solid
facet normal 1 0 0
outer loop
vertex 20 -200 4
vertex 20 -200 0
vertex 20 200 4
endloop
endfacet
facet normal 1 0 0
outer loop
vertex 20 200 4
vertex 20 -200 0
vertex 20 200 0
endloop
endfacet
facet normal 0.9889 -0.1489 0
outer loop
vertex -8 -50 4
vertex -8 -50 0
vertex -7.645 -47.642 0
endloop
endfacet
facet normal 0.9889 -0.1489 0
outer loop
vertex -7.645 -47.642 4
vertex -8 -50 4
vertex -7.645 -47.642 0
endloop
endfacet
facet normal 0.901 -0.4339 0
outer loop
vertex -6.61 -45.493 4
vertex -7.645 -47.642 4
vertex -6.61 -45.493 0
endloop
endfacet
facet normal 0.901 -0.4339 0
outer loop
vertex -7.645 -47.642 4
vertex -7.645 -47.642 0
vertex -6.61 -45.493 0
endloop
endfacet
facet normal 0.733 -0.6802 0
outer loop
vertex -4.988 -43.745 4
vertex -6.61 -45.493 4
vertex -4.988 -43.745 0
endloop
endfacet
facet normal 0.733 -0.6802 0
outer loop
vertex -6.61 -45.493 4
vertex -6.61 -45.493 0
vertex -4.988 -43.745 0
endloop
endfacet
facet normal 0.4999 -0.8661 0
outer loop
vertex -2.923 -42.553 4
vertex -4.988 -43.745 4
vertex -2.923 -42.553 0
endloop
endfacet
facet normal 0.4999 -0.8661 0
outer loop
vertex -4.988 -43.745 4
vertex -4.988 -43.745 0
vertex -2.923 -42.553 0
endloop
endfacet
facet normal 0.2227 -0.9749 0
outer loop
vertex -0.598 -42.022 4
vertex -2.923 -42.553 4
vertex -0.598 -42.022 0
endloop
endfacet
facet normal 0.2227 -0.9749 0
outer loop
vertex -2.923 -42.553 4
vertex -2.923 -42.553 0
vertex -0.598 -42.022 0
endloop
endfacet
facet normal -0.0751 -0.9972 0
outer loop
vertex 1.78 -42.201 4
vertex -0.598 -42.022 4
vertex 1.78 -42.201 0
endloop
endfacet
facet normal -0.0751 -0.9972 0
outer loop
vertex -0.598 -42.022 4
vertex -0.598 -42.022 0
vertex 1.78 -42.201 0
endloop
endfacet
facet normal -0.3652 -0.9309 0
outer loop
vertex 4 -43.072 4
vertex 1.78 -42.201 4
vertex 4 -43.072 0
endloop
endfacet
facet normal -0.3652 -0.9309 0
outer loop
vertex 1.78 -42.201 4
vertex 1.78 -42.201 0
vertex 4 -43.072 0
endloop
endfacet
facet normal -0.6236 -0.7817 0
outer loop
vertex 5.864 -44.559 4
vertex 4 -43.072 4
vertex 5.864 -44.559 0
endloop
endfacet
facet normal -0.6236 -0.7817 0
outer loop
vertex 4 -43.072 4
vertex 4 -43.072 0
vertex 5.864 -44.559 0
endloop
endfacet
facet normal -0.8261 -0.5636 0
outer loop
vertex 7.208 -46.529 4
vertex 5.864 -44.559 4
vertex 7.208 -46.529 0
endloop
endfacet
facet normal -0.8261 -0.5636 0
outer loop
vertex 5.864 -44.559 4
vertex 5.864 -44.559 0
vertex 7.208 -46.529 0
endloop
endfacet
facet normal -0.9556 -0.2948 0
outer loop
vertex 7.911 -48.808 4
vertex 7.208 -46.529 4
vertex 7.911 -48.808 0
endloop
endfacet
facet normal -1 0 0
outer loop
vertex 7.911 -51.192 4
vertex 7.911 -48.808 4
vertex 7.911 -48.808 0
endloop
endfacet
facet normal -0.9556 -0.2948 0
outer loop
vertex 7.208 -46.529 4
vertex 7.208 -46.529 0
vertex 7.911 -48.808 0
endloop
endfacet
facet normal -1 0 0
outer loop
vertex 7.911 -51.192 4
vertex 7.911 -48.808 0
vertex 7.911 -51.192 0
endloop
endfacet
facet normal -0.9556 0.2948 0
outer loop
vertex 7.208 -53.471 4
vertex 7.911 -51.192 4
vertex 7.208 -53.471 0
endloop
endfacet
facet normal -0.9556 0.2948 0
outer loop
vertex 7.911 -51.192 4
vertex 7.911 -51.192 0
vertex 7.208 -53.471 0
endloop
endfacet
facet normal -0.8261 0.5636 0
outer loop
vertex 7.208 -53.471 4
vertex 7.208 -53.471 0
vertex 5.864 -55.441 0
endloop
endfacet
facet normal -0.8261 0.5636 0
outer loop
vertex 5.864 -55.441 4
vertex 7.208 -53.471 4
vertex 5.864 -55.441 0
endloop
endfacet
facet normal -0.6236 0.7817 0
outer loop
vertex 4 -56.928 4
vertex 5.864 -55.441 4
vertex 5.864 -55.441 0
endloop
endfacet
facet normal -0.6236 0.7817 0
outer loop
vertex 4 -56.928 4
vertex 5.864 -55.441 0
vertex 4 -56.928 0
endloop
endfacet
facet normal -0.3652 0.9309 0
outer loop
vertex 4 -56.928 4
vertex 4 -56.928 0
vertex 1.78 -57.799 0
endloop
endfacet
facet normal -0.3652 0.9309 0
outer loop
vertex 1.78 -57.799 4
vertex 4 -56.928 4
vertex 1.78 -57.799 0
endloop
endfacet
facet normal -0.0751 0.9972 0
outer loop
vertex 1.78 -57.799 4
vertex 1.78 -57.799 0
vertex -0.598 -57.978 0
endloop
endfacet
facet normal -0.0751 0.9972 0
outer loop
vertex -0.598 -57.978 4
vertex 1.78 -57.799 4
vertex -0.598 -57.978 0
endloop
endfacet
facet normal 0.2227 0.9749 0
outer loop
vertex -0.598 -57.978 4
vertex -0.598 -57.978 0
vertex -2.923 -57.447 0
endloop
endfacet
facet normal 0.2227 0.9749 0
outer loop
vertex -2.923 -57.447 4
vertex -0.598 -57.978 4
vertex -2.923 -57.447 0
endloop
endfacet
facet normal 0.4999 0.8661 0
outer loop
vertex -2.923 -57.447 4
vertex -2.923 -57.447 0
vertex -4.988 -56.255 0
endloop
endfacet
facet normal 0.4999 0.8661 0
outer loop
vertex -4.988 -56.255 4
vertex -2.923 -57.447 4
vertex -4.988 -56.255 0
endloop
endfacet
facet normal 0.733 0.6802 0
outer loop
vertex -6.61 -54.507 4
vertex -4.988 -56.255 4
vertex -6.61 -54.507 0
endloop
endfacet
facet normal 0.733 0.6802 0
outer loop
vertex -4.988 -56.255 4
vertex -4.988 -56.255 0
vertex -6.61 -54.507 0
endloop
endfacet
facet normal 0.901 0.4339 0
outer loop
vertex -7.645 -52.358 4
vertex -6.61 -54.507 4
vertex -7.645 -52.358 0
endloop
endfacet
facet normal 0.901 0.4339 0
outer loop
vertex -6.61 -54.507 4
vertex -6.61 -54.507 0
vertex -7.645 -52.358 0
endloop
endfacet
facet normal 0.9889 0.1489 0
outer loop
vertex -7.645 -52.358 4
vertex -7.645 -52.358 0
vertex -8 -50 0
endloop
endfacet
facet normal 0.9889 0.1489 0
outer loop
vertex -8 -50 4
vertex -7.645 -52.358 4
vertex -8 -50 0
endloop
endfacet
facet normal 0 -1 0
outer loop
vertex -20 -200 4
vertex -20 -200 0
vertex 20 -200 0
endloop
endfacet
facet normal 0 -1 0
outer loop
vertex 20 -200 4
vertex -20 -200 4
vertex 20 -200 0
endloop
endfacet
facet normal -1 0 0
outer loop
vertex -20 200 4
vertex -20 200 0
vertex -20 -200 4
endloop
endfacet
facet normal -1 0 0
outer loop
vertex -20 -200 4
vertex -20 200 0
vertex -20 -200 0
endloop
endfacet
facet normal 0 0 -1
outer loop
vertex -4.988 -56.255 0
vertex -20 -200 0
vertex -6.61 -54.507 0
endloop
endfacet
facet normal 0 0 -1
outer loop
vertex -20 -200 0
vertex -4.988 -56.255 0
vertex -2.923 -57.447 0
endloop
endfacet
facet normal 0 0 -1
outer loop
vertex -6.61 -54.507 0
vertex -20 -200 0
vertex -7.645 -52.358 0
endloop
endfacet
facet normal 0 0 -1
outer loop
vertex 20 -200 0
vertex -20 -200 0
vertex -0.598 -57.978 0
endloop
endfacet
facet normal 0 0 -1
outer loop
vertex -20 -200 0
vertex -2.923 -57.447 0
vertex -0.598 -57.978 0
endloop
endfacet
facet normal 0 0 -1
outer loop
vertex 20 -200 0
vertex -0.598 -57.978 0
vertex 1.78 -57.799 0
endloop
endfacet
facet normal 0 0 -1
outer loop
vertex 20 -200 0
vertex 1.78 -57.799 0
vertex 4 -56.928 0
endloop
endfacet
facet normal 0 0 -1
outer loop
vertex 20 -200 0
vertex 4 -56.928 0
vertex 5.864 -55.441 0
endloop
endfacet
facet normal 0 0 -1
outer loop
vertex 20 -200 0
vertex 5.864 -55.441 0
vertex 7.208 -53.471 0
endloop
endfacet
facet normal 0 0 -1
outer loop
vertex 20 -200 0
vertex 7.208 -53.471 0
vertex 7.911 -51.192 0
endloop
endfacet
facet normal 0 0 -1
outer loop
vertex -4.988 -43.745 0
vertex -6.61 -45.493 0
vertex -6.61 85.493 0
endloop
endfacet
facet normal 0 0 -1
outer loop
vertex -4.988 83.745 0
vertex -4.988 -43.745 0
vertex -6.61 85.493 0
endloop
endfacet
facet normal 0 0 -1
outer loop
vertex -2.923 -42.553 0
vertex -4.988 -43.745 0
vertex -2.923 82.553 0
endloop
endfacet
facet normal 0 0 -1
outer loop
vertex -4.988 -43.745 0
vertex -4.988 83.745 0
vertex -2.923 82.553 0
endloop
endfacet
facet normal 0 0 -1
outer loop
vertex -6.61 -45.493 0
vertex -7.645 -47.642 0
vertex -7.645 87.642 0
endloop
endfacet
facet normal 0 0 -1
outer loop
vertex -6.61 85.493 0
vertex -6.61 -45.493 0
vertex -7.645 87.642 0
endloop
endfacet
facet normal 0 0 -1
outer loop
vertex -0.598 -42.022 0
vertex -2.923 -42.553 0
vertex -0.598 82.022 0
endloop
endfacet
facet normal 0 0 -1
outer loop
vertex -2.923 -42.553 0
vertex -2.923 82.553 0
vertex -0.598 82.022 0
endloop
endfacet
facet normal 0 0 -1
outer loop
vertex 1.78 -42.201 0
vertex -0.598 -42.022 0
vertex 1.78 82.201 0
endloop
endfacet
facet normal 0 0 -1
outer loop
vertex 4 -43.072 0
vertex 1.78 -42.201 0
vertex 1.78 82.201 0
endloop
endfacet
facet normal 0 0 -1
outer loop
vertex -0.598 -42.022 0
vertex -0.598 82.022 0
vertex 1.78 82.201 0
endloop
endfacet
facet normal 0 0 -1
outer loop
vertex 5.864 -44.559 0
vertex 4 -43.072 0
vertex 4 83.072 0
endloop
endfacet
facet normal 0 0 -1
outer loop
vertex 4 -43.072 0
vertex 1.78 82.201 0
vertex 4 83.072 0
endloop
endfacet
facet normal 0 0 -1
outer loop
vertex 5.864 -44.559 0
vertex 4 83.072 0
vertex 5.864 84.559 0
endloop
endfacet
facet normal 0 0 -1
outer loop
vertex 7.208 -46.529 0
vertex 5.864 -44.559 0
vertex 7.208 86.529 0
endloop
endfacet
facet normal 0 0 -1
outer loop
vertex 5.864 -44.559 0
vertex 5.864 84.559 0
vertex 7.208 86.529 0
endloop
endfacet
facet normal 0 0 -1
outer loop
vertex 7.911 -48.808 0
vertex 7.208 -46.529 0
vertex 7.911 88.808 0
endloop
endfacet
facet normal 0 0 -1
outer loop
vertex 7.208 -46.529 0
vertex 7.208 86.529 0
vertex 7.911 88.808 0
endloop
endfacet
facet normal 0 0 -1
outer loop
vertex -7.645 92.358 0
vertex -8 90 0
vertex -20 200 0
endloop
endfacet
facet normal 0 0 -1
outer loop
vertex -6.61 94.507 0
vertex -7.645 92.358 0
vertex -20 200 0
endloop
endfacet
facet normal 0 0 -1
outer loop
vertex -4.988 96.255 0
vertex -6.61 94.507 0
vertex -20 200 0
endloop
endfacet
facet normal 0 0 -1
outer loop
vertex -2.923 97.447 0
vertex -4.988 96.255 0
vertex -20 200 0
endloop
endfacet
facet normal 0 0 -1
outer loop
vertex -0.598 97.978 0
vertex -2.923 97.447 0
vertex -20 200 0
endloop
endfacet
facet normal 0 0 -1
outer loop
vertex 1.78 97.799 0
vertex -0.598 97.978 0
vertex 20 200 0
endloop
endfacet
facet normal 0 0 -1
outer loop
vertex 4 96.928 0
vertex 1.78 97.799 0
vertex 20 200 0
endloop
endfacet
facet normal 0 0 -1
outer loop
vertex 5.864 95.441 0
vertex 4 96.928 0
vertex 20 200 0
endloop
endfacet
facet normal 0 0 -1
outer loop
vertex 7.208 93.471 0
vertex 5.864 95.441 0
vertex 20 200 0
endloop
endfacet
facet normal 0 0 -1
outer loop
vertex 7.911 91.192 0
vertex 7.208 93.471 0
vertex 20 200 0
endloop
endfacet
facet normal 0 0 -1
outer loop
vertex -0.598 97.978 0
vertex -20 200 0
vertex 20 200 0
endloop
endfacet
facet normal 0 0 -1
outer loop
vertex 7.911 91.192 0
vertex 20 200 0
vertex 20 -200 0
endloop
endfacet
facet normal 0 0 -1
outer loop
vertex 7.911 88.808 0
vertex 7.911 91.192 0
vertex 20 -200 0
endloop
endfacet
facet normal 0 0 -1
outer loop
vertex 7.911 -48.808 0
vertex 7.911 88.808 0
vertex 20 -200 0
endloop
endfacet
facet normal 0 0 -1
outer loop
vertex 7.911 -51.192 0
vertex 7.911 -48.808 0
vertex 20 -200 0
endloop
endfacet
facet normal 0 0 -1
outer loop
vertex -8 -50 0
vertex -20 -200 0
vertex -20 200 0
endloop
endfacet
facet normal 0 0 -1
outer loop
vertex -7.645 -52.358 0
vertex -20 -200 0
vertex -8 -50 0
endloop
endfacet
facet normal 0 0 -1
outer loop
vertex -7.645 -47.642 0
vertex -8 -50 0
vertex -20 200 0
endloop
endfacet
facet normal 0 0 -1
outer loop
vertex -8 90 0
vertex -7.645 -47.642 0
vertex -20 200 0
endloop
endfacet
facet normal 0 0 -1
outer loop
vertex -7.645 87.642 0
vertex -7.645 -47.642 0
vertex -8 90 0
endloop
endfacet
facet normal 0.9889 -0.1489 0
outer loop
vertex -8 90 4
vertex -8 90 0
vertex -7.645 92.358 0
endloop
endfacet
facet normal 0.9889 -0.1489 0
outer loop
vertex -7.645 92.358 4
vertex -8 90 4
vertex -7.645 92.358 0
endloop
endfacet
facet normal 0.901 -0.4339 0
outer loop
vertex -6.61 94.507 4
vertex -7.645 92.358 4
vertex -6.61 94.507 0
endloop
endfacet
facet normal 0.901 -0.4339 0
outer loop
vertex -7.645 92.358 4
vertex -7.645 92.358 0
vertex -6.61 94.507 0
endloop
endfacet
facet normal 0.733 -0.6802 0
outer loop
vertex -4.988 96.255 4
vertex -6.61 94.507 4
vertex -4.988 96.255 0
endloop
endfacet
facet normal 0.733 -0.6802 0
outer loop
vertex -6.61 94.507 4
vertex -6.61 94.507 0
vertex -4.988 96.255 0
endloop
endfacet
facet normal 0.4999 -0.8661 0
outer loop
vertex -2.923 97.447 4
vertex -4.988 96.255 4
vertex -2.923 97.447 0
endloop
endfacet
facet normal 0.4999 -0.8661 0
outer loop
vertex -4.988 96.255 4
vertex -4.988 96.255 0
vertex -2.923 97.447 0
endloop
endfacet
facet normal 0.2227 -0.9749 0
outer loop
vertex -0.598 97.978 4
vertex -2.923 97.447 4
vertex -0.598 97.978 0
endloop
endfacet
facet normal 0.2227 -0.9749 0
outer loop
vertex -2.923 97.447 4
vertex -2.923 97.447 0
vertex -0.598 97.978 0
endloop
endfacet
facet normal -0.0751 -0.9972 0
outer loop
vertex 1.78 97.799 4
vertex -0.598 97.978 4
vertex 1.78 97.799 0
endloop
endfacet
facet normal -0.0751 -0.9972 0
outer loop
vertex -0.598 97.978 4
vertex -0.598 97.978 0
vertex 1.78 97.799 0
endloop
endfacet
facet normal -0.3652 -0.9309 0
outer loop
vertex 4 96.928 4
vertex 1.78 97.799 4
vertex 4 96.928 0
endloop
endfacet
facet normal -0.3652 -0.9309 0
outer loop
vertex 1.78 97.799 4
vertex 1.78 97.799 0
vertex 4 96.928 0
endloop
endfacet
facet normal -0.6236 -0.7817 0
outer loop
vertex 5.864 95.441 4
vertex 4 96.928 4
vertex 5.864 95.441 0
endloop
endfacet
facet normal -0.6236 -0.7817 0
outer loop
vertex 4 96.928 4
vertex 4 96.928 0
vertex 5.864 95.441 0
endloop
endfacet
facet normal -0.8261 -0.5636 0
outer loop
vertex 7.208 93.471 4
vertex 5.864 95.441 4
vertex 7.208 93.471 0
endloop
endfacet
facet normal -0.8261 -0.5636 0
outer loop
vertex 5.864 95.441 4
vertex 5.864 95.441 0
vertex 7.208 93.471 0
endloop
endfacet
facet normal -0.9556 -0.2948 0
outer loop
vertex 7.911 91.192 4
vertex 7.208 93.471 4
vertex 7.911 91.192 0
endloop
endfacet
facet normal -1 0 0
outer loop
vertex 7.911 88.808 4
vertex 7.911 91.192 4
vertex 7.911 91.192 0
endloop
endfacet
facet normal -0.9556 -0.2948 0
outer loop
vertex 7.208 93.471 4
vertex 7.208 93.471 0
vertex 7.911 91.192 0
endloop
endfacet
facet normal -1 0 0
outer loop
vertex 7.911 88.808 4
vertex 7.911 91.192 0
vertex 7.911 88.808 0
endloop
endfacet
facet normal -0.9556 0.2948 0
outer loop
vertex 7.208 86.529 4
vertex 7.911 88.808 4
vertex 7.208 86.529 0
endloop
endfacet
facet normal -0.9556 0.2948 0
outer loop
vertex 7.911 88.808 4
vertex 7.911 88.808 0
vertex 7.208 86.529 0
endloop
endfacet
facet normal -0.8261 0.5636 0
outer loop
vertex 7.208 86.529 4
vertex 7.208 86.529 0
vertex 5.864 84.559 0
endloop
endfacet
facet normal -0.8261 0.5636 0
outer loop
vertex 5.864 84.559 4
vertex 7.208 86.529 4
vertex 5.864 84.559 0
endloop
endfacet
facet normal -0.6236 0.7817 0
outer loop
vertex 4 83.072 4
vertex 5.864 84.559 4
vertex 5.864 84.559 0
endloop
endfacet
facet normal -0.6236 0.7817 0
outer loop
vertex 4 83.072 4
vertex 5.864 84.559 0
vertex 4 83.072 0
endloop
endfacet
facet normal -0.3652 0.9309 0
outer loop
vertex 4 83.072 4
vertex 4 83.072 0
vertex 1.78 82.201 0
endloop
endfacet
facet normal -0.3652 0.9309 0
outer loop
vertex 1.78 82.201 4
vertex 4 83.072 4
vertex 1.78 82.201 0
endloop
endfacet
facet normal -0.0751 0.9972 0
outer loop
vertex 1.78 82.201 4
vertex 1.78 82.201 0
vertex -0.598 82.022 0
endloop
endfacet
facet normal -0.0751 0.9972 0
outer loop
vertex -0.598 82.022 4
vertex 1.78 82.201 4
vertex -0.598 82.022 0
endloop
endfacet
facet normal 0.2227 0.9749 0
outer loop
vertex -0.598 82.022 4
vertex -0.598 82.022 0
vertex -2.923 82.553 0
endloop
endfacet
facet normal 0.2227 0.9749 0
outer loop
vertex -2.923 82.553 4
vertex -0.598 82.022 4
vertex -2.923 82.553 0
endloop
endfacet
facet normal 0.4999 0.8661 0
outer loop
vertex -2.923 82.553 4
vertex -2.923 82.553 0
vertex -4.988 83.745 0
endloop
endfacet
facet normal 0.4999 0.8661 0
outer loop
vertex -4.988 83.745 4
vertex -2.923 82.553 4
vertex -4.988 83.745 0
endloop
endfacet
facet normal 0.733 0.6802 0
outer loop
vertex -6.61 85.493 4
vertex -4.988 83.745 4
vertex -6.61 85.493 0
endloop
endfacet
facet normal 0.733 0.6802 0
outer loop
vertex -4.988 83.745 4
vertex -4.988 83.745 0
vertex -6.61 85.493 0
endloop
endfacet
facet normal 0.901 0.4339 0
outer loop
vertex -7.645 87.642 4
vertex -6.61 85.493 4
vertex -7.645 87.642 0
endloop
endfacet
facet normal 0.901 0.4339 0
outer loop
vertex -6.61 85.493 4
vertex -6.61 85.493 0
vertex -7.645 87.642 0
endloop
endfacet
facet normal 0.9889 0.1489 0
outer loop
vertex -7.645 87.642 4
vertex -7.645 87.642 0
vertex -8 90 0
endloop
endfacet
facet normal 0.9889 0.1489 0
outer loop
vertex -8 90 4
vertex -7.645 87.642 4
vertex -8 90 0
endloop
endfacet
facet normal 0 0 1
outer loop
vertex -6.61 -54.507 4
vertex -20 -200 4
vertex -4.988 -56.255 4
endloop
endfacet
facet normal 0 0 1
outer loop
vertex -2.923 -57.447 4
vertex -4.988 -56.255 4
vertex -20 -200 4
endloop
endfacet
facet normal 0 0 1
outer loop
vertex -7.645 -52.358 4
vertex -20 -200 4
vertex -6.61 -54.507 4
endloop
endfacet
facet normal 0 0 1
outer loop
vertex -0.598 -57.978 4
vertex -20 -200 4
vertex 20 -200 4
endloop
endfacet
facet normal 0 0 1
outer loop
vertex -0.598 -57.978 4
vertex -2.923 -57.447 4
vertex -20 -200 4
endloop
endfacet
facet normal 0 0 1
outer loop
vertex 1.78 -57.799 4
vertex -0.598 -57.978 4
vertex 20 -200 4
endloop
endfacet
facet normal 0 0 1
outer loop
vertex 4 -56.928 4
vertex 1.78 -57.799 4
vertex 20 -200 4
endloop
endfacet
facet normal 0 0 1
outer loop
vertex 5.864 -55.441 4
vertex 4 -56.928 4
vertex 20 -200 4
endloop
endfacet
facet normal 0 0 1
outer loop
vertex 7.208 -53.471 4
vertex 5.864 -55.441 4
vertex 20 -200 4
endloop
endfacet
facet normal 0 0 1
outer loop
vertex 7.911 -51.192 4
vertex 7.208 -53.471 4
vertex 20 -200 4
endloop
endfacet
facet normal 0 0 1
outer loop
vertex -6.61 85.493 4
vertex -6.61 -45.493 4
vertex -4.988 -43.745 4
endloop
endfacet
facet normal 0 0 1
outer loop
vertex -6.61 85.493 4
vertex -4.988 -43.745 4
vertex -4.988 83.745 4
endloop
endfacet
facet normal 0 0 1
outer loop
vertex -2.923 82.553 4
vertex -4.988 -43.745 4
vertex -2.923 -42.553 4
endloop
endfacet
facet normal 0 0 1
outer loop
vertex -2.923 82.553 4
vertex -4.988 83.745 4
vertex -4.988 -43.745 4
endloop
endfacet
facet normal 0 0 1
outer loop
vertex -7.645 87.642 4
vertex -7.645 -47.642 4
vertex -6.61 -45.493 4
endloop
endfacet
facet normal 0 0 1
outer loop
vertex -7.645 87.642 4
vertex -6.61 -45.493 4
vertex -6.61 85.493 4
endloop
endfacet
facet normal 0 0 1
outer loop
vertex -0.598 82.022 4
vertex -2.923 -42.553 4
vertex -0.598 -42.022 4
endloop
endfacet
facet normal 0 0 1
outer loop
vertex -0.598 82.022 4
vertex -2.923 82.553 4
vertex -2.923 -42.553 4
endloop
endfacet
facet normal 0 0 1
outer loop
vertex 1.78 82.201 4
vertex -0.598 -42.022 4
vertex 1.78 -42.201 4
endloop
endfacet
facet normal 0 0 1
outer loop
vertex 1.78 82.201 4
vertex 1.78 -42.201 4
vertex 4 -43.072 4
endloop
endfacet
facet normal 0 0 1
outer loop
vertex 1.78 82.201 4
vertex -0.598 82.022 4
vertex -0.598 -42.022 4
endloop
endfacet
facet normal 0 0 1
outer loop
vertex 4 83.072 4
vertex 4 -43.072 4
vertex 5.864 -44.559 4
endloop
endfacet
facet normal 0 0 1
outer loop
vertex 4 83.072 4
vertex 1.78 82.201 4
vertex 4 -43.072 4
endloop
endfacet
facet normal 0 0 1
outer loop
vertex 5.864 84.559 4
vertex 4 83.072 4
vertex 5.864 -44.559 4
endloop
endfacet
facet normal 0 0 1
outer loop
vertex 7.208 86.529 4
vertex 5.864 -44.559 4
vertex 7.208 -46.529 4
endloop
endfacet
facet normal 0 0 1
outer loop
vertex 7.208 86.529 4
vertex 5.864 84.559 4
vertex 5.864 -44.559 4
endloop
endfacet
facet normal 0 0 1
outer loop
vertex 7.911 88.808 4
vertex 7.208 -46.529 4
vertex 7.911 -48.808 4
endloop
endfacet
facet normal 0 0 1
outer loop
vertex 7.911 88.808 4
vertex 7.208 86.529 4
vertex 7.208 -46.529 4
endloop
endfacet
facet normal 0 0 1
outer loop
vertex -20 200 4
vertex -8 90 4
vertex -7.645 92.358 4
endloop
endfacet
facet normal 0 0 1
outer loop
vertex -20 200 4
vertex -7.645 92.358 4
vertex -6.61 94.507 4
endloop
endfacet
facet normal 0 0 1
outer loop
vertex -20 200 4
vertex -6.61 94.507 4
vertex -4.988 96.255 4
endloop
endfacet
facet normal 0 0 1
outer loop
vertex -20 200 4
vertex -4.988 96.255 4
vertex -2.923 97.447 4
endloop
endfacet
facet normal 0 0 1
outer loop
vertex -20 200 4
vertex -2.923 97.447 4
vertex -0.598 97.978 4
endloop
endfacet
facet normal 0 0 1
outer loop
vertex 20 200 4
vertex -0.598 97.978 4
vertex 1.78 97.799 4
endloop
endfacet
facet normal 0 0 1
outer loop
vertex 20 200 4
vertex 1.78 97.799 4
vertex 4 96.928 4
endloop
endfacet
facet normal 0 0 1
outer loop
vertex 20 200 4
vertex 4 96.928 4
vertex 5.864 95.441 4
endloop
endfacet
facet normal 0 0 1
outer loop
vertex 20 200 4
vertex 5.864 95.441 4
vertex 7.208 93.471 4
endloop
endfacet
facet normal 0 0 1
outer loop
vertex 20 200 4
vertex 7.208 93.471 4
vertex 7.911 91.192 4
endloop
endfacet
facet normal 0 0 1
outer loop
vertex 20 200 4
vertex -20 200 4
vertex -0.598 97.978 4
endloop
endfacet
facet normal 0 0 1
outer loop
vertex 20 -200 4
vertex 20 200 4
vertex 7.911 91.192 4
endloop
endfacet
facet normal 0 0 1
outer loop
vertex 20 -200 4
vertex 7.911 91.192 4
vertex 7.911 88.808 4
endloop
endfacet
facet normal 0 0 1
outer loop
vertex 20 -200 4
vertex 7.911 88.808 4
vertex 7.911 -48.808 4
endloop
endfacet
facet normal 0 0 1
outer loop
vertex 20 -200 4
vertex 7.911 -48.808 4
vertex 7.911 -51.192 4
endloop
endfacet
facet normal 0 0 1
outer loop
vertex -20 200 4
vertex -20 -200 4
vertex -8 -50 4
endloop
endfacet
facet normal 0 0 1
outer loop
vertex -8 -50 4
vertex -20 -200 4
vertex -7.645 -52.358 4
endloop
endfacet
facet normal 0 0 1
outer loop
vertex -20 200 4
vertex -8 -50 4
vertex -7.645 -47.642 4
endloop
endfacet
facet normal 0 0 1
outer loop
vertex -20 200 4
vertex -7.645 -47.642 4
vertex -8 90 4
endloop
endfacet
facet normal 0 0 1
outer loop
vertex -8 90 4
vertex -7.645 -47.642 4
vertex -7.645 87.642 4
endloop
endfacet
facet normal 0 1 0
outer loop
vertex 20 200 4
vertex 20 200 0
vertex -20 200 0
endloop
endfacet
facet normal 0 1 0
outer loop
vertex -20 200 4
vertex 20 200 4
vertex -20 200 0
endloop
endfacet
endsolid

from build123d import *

# Parameters (mm, degrees)
BOSS_EXTRUDE1_DEPTH = 4
SKETCH3_R           = 8
BOSS_EXTRUDE2_DEPTH = 4
SKETCH3_2_R         = 8
CUT_EXTRUDE1_DEPTH  = 4


with BuildPart() as part:
    # Sketch1 → Boss-Extrude1 (new body)
    with BuildSketch(Plane.XY):
        Polygon((-20, 140), (-20, -140), (-20, -200), (20, -200), (20, -140), (20, 140), (20, 200), (-20, 200), align=None)
    extrude(amount=BOSS_EXTRUDE1_DEPTH)

    # Sketch3 → Boss-Extrude2 (add)
    with BuildSketch(Plane(origin=(0, 0, 0), x_dir=(-1, 0, 0), z_dir=(0, 0, -1))):
        with Locations((0, 90)):
            Circle(SKETCH3_R)
        with Locations((0, -50)):
            Circle(SKETCH3_R)
    extrude(amount=-BOSS_EXTRUDE2_DEPTH)

    # Sketch3<2> → Cut-Extrude1 (cut)
    with BuildSketch(Plane(origin=(0, 0, 0), x_dir=(-1, 0, 0), z_dir=(0, 0, -1))):
        with Locations((0, 90)):
            Circle(SKETCH3_2_R)
        with Locations((0, -50)):
            Circle(SKETCH3_2_R)
    extrude(amount=-CUT_EXTRUDE1_DEPTH, mode=Mode.SUBTRACT)


solid = part.part
